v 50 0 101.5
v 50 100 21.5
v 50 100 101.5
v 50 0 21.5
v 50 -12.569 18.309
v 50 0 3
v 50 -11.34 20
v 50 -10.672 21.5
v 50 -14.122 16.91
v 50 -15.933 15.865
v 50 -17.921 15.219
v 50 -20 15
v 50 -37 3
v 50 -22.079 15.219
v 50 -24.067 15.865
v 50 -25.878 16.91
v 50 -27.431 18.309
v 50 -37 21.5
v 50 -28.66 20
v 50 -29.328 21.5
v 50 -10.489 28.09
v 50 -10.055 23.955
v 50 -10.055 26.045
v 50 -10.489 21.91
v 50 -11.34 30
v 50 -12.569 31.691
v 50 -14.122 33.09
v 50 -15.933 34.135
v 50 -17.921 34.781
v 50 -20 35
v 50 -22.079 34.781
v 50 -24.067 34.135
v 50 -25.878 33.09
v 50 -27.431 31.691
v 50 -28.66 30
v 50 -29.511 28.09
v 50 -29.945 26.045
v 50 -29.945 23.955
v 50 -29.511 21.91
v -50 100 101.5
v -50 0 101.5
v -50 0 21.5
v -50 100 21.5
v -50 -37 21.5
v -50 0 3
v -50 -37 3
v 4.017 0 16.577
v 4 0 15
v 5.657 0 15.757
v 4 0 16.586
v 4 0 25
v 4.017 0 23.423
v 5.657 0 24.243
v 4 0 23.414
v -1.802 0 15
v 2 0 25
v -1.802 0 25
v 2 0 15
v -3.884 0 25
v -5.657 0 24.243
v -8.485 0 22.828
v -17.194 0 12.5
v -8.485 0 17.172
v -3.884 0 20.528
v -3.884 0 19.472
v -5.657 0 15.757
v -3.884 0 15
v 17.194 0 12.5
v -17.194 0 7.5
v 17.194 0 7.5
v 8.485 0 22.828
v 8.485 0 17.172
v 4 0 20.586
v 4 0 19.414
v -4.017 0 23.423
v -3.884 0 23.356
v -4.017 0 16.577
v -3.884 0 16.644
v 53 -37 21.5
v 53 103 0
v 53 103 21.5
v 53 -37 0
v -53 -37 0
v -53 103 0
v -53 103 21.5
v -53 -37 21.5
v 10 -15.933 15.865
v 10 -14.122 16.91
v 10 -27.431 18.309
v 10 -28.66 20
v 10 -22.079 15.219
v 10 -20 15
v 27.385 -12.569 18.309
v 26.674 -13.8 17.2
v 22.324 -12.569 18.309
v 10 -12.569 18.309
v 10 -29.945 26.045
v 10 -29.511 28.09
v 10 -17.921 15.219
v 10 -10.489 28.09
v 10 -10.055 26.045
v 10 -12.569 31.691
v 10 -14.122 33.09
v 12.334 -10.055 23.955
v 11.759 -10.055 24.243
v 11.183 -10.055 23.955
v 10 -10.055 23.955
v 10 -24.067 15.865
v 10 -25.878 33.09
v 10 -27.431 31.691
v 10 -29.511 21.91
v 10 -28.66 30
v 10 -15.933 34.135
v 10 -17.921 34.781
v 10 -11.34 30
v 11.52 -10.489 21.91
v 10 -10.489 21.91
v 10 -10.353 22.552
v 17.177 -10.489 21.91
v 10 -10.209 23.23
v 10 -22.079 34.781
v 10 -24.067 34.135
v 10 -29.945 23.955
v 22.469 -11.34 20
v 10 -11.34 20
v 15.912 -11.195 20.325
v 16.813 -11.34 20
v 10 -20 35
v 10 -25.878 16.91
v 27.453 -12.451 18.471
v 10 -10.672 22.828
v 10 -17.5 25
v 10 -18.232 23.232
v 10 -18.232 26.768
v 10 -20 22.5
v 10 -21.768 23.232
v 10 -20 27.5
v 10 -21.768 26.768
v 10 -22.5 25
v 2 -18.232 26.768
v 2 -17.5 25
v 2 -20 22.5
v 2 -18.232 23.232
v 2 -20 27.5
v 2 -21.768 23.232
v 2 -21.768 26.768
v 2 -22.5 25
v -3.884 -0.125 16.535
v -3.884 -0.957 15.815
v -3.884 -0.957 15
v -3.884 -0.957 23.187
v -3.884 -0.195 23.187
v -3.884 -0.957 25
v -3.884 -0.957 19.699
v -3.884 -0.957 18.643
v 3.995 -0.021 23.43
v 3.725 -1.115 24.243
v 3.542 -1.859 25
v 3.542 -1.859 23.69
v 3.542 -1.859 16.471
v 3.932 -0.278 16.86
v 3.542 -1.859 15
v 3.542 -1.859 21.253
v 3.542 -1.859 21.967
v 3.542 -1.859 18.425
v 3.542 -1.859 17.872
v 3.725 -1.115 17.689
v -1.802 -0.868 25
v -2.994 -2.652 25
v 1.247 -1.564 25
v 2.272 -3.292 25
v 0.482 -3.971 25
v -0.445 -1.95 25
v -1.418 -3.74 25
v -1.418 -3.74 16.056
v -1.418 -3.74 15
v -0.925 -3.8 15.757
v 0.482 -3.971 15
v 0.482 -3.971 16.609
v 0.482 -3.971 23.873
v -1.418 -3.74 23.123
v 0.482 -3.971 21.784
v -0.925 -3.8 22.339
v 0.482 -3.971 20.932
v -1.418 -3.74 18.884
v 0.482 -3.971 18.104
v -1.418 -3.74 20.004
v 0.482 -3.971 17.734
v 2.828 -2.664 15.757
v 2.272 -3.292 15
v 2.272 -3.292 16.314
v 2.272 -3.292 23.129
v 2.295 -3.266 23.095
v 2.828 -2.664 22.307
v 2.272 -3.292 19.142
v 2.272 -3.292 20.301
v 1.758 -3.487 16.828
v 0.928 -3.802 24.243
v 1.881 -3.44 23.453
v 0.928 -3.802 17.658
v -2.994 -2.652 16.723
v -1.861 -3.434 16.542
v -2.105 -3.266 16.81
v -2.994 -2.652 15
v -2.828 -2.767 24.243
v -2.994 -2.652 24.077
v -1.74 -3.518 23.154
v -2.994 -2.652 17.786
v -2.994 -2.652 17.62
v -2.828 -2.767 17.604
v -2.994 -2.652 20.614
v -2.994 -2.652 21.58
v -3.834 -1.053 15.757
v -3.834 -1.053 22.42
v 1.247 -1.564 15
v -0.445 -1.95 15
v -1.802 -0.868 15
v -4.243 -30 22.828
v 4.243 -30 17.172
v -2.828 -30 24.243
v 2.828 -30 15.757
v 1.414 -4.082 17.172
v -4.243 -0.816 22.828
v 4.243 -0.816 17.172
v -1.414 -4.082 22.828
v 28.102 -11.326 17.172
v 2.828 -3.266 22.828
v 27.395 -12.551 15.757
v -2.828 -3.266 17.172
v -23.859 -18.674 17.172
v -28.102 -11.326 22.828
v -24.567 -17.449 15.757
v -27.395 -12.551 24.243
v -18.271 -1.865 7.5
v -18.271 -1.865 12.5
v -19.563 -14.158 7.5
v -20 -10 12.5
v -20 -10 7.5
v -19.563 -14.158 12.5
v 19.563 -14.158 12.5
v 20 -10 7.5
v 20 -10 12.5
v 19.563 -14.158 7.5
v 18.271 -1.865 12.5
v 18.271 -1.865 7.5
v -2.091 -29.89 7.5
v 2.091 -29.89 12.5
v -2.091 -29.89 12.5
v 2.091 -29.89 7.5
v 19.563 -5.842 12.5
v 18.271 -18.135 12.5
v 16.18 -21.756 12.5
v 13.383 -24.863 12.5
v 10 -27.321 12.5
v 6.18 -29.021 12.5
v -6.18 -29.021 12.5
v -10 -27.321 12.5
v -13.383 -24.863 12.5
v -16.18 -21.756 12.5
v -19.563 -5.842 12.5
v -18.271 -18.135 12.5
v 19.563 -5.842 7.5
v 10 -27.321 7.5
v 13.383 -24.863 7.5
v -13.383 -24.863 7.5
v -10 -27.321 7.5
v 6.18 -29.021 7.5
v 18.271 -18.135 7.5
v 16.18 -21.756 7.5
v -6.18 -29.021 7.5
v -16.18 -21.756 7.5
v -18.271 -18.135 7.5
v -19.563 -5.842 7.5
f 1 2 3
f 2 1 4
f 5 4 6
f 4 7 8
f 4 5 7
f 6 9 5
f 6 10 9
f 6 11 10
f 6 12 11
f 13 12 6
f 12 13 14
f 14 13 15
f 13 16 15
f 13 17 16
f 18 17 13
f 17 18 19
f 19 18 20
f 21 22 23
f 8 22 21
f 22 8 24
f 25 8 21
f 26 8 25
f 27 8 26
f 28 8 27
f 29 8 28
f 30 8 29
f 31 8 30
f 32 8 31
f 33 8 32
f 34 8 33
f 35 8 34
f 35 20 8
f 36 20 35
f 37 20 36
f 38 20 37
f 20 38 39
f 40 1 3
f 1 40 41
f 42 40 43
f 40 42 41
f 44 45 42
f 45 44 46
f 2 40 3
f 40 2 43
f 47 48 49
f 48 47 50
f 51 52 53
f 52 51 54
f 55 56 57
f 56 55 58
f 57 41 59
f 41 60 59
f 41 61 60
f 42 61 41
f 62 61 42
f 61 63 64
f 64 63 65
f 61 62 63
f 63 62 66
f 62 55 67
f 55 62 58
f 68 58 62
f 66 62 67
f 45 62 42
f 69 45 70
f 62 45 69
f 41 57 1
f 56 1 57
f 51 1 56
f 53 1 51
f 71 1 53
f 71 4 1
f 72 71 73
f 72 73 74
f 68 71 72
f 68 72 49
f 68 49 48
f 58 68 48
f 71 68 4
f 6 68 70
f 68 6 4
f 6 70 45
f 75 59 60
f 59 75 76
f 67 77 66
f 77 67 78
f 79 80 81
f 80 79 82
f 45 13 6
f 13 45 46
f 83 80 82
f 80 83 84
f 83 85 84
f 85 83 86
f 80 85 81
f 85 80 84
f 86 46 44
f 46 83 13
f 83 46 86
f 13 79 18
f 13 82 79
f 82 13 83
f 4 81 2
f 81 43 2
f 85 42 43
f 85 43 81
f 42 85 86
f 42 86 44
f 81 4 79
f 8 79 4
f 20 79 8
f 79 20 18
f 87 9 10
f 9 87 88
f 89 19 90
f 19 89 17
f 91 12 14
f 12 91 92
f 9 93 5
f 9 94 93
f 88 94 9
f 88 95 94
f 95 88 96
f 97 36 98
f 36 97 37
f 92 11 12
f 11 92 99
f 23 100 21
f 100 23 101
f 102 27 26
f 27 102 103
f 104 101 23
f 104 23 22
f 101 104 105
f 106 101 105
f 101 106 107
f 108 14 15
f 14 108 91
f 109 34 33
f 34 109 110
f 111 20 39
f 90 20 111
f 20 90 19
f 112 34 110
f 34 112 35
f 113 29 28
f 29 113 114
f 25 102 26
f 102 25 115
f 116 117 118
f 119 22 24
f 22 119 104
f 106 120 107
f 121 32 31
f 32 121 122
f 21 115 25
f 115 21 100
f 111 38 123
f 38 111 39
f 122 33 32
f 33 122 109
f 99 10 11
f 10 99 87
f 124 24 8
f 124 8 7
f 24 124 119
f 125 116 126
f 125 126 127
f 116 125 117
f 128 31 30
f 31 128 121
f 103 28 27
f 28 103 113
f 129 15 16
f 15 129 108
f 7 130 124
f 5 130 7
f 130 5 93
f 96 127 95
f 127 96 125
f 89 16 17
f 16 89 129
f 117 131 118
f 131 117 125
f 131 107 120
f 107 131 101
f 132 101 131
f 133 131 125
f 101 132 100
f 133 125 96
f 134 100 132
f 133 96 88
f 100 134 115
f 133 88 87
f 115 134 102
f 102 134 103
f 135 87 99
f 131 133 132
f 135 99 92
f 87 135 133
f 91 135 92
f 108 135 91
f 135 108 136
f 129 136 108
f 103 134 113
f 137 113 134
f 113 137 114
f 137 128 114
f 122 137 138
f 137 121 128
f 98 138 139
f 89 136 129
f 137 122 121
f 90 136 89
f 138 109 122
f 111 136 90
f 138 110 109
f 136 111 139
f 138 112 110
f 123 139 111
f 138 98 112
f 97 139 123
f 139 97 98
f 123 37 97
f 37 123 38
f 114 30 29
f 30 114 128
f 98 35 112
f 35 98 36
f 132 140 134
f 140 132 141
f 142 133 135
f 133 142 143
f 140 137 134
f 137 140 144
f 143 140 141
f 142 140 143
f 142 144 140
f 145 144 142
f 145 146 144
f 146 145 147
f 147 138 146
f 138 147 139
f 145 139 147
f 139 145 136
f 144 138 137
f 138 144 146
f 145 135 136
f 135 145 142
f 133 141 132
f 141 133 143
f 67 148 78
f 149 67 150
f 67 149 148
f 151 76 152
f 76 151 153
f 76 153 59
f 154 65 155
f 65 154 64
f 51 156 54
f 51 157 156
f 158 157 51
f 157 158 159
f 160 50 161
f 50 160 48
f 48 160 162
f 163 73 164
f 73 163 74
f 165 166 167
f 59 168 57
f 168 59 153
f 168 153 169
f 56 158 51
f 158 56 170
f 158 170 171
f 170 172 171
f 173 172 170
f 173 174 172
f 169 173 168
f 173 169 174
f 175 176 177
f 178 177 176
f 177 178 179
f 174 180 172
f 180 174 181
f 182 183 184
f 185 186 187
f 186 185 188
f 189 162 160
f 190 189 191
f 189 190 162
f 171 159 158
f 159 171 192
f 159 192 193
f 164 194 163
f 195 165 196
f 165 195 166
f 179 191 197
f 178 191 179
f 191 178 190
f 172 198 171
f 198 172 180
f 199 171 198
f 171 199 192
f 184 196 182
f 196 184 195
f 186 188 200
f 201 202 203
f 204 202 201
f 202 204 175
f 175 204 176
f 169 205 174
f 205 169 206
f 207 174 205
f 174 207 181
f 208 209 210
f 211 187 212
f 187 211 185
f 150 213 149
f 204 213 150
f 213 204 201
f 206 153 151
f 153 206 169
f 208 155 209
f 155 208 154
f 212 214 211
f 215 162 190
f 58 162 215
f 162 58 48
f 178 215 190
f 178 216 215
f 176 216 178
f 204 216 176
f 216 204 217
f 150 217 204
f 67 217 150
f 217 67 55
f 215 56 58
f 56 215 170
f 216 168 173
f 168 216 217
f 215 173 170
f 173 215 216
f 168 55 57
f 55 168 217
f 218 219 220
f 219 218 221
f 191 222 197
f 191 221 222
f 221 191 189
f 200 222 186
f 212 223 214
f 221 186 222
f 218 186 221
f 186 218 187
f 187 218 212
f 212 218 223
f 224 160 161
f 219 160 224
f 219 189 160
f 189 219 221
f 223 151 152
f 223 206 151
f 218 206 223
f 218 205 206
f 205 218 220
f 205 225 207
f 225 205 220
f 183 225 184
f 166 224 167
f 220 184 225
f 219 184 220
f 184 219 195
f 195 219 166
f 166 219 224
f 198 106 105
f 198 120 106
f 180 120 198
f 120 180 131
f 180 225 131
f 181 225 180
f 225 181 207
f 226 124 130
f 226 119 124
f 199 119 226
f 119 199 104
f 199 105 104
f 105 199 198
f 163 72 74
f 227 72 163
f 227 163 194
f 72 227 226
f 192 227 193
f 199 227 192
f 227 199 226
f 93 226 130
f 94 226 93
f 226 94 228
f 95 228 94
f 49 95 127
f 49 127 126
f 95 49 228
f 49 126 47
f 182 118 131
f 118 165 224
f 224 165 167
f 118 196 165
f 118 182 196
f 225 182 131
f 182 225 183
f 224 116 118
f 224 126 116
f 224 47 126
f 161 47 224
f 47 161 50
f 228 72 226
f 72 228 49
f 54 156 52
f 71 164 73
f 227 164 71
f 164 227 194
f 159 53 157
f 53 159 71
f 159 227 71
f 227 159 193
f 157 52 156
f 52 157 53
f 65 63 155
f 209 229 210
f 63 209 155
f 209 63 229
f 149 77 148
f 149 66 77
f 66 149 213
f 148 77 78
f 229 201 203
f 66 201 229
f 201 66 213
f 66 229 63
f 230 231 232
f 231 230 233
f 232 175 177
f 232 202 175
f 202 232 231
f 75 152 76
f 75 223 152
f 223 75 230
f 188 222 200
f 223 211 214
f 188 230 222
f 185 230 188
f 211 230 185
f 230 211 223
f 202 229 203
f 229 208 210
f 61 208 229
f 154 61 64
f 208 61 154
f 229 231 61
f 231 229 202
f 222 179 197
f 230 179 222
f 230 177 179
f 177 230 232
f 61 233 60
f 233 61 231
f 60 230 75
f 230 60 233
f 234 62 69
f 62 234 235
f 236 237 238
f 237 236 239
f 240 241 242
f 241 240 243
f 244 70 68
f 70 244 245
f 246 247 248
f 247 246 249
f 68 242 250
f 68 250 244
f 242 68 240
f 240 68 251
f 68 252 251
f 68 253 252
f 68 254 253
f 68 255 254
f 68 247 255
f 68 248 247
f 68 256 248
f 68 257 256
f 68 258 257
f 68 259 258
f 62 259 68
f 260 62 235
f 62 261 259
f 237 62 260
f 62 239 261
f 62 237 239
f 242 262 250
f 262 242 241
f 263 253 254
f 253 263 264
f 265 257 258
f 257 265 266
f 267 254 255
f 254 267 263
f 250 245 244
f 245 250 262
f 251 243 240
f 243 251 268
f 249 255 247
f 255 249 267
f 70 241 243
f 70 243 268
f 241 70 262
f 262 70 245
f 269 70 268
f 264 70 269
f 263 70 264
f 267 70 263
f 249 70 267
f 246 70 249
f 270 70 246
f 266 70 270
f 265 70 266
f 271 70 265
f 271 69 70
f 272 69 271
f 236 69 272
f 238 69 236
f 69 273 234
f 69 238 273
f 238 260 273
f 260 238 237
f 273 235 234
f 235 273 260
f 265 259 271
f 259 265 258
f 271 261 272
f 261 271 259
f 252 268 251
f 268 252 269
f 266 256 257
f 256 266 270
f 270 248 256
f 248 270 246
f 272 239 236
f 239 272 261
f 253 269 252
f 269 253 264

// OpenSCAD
/*******************************************************************************
 * The base for the resin wash station.
 *
 * A key part of this design is that the motor should never be directly under a
 * liquid reservoir. Most designs I have found lack this principle.
 ******************************************************************************/

module baseCase(reservoirDimensions, baseDimensions, thickness) {
  translate([
    0,
    reservoirDimensions.y / 2,
    thickness / 2 + reservoirDimensions.z / 2,
  ])
    #cube(reservoirDimensions, center = true);
  // Floor.
  translate([
    0,
    reservoirDimensions.y - (baseDimensions.y / 2 - thickness),
    thickness / 2,
  ])
    cube([
      baseDimensions.x + thickness * 2,
      baseDimensions.y,
      thickness,
    ], center = true);

  // Port side.
  translate([
    baseDimensions.x / 2 + thickness / 2,
    reservoirDimensions.y - (baseDimensions.y / 2 - thickness),
    baseDimensions.z / 2 + thickness / 2,
  ])
    cube([
      thickness,
      baseDimensions.y,
      baseDimensions.z,
    ], center = true);

  // Starboard side.
  translate([
    -(baseDimensions.x / 2 + thickness / 2),
    reservoirDimensions.y - (baseDimensions.y / 2 - thickness),
    baseDimensions.z / 2 + thickness / 2,
  ])
    cube([
      thickness,
      baseDimensions.y,
      baseDimensions.z,
    ], center = true);

  // Back side.
  translate([
    0,
    reservoirDimensions.y + thickness / 2,
    baseDimensions.z / 2 + thickness / 2,
  ])
    cube([
      baseDimensions.x,
      thickness,
      baseDimensions.z,
    ], center = true);
}

module motorPlaceholder() {
  radius = 10;
  height = 40;
  shaftHeight = height * 0.2;
  color("cyan") {
    translate([10, 0, 0]) {
      translate([0, -radius * 2, (radius / 2) + 20])
        rotate(a=90, v=[0,1,0])
        cylinder(r = radius, h = height);
      translate([-shaftHeight, -radius * 2, (radius / 2) + 20])
        rotate(a=90, v=[0,1,0])
        cylinder(r = radius * 0.25, h = shaftHeight);
      }
  }
}

module bevelGearMotor() {
  radius = 20;
  height = 5;
  color("magenta")
    translate([0, -radius / 2, height + 5])
    cylinder(r = radius, h = height, center = true);
}

module stirringGear() {
  radius = 20;
  height = 5;
  color("green")
    translate([0, 50 - radius / 2, height + 5])
    cylinder(r = radius, h = height, center = true);
}

module stirringArms() {
  $fn=100;
  length = 40;
  width = 10;
  thickness = 3;
  magnetDiameter = 6;
  color("orange") {
    translate([0, 30, 20]) {
      difference() {
        union() {
          cube([length, width, thickness / 2], center = true);
          translate([length / 2 - magnetDiameter, 0, thickness / 2])
            magnetRing(magnetDiameter, thickness);
          translate([-length / 2 + magnetDiameter, 0, thickness / 2])
            magnetRing(magnetDiameter, thickness);
        }
        cylinder(radius = 5, h = thickness * 2, center = true);
      }
    }
  }
}

module magnetRing(magnetDiameter, thickness) {
  difference() {
    cylinder(d = magnetDiameter + thickness, h = thickness, center = true);
    translate([0, 0, 0.1])
      cylinder(d = magnetDiameter, h = thickness + 0.2, center = true);
  }
}

module spinner() {
  shaftThickness = 4;
  shaftGap = 2;
  fanHeight = 10;
  fanThickness = 2;
  bladeLength = 30;
  bladeCount = 6;
  // I could probably find fancy fan blade code here:
  // https://github.com/hyperair/fan-blades
  // but it's probably enough for now to just use 45º angled blades.
  color("lime")
    translate([0, 0, 20]) {
      difference() {
        cylinder(r = shaftThickness, h = fanHeight, center = true);
        cylinder(r = shaftGap, h = fanHeight + 0.2, center = true);
      }
      for(i = [0 : 1 : bladeCount]) {
        difference() {
          rotate(a=(i / bladeCount) * 360, v=[0, 0, 1])
          rotate(a=90, v=[1, 0, 0])
            rotate(a=45, v=[0,0,1])
            translate([0, 0, bladeLength / 2])
            // I need to do hypotenuse computation here.
            cube([fanThickness, fanHeight /*  * tan(0.5) */ , bladeLength], center = true);
          // Subtract the shaft so we don't intersect it.
          cylinder(r = shaftThickness, h = fanHeight, center = true);
        }
      }
    }
}

module spinnerCage() {

}

reservoir = [ 100, 100, 100 ];
base = [100, 140, 20 ];
thickness = 3;

baseCase(reservoir, base, thickness);
motorPlaceholder();
bevelGearMotor();
stirringGear();
stirringArms();
spinnerCage();
spinner();
